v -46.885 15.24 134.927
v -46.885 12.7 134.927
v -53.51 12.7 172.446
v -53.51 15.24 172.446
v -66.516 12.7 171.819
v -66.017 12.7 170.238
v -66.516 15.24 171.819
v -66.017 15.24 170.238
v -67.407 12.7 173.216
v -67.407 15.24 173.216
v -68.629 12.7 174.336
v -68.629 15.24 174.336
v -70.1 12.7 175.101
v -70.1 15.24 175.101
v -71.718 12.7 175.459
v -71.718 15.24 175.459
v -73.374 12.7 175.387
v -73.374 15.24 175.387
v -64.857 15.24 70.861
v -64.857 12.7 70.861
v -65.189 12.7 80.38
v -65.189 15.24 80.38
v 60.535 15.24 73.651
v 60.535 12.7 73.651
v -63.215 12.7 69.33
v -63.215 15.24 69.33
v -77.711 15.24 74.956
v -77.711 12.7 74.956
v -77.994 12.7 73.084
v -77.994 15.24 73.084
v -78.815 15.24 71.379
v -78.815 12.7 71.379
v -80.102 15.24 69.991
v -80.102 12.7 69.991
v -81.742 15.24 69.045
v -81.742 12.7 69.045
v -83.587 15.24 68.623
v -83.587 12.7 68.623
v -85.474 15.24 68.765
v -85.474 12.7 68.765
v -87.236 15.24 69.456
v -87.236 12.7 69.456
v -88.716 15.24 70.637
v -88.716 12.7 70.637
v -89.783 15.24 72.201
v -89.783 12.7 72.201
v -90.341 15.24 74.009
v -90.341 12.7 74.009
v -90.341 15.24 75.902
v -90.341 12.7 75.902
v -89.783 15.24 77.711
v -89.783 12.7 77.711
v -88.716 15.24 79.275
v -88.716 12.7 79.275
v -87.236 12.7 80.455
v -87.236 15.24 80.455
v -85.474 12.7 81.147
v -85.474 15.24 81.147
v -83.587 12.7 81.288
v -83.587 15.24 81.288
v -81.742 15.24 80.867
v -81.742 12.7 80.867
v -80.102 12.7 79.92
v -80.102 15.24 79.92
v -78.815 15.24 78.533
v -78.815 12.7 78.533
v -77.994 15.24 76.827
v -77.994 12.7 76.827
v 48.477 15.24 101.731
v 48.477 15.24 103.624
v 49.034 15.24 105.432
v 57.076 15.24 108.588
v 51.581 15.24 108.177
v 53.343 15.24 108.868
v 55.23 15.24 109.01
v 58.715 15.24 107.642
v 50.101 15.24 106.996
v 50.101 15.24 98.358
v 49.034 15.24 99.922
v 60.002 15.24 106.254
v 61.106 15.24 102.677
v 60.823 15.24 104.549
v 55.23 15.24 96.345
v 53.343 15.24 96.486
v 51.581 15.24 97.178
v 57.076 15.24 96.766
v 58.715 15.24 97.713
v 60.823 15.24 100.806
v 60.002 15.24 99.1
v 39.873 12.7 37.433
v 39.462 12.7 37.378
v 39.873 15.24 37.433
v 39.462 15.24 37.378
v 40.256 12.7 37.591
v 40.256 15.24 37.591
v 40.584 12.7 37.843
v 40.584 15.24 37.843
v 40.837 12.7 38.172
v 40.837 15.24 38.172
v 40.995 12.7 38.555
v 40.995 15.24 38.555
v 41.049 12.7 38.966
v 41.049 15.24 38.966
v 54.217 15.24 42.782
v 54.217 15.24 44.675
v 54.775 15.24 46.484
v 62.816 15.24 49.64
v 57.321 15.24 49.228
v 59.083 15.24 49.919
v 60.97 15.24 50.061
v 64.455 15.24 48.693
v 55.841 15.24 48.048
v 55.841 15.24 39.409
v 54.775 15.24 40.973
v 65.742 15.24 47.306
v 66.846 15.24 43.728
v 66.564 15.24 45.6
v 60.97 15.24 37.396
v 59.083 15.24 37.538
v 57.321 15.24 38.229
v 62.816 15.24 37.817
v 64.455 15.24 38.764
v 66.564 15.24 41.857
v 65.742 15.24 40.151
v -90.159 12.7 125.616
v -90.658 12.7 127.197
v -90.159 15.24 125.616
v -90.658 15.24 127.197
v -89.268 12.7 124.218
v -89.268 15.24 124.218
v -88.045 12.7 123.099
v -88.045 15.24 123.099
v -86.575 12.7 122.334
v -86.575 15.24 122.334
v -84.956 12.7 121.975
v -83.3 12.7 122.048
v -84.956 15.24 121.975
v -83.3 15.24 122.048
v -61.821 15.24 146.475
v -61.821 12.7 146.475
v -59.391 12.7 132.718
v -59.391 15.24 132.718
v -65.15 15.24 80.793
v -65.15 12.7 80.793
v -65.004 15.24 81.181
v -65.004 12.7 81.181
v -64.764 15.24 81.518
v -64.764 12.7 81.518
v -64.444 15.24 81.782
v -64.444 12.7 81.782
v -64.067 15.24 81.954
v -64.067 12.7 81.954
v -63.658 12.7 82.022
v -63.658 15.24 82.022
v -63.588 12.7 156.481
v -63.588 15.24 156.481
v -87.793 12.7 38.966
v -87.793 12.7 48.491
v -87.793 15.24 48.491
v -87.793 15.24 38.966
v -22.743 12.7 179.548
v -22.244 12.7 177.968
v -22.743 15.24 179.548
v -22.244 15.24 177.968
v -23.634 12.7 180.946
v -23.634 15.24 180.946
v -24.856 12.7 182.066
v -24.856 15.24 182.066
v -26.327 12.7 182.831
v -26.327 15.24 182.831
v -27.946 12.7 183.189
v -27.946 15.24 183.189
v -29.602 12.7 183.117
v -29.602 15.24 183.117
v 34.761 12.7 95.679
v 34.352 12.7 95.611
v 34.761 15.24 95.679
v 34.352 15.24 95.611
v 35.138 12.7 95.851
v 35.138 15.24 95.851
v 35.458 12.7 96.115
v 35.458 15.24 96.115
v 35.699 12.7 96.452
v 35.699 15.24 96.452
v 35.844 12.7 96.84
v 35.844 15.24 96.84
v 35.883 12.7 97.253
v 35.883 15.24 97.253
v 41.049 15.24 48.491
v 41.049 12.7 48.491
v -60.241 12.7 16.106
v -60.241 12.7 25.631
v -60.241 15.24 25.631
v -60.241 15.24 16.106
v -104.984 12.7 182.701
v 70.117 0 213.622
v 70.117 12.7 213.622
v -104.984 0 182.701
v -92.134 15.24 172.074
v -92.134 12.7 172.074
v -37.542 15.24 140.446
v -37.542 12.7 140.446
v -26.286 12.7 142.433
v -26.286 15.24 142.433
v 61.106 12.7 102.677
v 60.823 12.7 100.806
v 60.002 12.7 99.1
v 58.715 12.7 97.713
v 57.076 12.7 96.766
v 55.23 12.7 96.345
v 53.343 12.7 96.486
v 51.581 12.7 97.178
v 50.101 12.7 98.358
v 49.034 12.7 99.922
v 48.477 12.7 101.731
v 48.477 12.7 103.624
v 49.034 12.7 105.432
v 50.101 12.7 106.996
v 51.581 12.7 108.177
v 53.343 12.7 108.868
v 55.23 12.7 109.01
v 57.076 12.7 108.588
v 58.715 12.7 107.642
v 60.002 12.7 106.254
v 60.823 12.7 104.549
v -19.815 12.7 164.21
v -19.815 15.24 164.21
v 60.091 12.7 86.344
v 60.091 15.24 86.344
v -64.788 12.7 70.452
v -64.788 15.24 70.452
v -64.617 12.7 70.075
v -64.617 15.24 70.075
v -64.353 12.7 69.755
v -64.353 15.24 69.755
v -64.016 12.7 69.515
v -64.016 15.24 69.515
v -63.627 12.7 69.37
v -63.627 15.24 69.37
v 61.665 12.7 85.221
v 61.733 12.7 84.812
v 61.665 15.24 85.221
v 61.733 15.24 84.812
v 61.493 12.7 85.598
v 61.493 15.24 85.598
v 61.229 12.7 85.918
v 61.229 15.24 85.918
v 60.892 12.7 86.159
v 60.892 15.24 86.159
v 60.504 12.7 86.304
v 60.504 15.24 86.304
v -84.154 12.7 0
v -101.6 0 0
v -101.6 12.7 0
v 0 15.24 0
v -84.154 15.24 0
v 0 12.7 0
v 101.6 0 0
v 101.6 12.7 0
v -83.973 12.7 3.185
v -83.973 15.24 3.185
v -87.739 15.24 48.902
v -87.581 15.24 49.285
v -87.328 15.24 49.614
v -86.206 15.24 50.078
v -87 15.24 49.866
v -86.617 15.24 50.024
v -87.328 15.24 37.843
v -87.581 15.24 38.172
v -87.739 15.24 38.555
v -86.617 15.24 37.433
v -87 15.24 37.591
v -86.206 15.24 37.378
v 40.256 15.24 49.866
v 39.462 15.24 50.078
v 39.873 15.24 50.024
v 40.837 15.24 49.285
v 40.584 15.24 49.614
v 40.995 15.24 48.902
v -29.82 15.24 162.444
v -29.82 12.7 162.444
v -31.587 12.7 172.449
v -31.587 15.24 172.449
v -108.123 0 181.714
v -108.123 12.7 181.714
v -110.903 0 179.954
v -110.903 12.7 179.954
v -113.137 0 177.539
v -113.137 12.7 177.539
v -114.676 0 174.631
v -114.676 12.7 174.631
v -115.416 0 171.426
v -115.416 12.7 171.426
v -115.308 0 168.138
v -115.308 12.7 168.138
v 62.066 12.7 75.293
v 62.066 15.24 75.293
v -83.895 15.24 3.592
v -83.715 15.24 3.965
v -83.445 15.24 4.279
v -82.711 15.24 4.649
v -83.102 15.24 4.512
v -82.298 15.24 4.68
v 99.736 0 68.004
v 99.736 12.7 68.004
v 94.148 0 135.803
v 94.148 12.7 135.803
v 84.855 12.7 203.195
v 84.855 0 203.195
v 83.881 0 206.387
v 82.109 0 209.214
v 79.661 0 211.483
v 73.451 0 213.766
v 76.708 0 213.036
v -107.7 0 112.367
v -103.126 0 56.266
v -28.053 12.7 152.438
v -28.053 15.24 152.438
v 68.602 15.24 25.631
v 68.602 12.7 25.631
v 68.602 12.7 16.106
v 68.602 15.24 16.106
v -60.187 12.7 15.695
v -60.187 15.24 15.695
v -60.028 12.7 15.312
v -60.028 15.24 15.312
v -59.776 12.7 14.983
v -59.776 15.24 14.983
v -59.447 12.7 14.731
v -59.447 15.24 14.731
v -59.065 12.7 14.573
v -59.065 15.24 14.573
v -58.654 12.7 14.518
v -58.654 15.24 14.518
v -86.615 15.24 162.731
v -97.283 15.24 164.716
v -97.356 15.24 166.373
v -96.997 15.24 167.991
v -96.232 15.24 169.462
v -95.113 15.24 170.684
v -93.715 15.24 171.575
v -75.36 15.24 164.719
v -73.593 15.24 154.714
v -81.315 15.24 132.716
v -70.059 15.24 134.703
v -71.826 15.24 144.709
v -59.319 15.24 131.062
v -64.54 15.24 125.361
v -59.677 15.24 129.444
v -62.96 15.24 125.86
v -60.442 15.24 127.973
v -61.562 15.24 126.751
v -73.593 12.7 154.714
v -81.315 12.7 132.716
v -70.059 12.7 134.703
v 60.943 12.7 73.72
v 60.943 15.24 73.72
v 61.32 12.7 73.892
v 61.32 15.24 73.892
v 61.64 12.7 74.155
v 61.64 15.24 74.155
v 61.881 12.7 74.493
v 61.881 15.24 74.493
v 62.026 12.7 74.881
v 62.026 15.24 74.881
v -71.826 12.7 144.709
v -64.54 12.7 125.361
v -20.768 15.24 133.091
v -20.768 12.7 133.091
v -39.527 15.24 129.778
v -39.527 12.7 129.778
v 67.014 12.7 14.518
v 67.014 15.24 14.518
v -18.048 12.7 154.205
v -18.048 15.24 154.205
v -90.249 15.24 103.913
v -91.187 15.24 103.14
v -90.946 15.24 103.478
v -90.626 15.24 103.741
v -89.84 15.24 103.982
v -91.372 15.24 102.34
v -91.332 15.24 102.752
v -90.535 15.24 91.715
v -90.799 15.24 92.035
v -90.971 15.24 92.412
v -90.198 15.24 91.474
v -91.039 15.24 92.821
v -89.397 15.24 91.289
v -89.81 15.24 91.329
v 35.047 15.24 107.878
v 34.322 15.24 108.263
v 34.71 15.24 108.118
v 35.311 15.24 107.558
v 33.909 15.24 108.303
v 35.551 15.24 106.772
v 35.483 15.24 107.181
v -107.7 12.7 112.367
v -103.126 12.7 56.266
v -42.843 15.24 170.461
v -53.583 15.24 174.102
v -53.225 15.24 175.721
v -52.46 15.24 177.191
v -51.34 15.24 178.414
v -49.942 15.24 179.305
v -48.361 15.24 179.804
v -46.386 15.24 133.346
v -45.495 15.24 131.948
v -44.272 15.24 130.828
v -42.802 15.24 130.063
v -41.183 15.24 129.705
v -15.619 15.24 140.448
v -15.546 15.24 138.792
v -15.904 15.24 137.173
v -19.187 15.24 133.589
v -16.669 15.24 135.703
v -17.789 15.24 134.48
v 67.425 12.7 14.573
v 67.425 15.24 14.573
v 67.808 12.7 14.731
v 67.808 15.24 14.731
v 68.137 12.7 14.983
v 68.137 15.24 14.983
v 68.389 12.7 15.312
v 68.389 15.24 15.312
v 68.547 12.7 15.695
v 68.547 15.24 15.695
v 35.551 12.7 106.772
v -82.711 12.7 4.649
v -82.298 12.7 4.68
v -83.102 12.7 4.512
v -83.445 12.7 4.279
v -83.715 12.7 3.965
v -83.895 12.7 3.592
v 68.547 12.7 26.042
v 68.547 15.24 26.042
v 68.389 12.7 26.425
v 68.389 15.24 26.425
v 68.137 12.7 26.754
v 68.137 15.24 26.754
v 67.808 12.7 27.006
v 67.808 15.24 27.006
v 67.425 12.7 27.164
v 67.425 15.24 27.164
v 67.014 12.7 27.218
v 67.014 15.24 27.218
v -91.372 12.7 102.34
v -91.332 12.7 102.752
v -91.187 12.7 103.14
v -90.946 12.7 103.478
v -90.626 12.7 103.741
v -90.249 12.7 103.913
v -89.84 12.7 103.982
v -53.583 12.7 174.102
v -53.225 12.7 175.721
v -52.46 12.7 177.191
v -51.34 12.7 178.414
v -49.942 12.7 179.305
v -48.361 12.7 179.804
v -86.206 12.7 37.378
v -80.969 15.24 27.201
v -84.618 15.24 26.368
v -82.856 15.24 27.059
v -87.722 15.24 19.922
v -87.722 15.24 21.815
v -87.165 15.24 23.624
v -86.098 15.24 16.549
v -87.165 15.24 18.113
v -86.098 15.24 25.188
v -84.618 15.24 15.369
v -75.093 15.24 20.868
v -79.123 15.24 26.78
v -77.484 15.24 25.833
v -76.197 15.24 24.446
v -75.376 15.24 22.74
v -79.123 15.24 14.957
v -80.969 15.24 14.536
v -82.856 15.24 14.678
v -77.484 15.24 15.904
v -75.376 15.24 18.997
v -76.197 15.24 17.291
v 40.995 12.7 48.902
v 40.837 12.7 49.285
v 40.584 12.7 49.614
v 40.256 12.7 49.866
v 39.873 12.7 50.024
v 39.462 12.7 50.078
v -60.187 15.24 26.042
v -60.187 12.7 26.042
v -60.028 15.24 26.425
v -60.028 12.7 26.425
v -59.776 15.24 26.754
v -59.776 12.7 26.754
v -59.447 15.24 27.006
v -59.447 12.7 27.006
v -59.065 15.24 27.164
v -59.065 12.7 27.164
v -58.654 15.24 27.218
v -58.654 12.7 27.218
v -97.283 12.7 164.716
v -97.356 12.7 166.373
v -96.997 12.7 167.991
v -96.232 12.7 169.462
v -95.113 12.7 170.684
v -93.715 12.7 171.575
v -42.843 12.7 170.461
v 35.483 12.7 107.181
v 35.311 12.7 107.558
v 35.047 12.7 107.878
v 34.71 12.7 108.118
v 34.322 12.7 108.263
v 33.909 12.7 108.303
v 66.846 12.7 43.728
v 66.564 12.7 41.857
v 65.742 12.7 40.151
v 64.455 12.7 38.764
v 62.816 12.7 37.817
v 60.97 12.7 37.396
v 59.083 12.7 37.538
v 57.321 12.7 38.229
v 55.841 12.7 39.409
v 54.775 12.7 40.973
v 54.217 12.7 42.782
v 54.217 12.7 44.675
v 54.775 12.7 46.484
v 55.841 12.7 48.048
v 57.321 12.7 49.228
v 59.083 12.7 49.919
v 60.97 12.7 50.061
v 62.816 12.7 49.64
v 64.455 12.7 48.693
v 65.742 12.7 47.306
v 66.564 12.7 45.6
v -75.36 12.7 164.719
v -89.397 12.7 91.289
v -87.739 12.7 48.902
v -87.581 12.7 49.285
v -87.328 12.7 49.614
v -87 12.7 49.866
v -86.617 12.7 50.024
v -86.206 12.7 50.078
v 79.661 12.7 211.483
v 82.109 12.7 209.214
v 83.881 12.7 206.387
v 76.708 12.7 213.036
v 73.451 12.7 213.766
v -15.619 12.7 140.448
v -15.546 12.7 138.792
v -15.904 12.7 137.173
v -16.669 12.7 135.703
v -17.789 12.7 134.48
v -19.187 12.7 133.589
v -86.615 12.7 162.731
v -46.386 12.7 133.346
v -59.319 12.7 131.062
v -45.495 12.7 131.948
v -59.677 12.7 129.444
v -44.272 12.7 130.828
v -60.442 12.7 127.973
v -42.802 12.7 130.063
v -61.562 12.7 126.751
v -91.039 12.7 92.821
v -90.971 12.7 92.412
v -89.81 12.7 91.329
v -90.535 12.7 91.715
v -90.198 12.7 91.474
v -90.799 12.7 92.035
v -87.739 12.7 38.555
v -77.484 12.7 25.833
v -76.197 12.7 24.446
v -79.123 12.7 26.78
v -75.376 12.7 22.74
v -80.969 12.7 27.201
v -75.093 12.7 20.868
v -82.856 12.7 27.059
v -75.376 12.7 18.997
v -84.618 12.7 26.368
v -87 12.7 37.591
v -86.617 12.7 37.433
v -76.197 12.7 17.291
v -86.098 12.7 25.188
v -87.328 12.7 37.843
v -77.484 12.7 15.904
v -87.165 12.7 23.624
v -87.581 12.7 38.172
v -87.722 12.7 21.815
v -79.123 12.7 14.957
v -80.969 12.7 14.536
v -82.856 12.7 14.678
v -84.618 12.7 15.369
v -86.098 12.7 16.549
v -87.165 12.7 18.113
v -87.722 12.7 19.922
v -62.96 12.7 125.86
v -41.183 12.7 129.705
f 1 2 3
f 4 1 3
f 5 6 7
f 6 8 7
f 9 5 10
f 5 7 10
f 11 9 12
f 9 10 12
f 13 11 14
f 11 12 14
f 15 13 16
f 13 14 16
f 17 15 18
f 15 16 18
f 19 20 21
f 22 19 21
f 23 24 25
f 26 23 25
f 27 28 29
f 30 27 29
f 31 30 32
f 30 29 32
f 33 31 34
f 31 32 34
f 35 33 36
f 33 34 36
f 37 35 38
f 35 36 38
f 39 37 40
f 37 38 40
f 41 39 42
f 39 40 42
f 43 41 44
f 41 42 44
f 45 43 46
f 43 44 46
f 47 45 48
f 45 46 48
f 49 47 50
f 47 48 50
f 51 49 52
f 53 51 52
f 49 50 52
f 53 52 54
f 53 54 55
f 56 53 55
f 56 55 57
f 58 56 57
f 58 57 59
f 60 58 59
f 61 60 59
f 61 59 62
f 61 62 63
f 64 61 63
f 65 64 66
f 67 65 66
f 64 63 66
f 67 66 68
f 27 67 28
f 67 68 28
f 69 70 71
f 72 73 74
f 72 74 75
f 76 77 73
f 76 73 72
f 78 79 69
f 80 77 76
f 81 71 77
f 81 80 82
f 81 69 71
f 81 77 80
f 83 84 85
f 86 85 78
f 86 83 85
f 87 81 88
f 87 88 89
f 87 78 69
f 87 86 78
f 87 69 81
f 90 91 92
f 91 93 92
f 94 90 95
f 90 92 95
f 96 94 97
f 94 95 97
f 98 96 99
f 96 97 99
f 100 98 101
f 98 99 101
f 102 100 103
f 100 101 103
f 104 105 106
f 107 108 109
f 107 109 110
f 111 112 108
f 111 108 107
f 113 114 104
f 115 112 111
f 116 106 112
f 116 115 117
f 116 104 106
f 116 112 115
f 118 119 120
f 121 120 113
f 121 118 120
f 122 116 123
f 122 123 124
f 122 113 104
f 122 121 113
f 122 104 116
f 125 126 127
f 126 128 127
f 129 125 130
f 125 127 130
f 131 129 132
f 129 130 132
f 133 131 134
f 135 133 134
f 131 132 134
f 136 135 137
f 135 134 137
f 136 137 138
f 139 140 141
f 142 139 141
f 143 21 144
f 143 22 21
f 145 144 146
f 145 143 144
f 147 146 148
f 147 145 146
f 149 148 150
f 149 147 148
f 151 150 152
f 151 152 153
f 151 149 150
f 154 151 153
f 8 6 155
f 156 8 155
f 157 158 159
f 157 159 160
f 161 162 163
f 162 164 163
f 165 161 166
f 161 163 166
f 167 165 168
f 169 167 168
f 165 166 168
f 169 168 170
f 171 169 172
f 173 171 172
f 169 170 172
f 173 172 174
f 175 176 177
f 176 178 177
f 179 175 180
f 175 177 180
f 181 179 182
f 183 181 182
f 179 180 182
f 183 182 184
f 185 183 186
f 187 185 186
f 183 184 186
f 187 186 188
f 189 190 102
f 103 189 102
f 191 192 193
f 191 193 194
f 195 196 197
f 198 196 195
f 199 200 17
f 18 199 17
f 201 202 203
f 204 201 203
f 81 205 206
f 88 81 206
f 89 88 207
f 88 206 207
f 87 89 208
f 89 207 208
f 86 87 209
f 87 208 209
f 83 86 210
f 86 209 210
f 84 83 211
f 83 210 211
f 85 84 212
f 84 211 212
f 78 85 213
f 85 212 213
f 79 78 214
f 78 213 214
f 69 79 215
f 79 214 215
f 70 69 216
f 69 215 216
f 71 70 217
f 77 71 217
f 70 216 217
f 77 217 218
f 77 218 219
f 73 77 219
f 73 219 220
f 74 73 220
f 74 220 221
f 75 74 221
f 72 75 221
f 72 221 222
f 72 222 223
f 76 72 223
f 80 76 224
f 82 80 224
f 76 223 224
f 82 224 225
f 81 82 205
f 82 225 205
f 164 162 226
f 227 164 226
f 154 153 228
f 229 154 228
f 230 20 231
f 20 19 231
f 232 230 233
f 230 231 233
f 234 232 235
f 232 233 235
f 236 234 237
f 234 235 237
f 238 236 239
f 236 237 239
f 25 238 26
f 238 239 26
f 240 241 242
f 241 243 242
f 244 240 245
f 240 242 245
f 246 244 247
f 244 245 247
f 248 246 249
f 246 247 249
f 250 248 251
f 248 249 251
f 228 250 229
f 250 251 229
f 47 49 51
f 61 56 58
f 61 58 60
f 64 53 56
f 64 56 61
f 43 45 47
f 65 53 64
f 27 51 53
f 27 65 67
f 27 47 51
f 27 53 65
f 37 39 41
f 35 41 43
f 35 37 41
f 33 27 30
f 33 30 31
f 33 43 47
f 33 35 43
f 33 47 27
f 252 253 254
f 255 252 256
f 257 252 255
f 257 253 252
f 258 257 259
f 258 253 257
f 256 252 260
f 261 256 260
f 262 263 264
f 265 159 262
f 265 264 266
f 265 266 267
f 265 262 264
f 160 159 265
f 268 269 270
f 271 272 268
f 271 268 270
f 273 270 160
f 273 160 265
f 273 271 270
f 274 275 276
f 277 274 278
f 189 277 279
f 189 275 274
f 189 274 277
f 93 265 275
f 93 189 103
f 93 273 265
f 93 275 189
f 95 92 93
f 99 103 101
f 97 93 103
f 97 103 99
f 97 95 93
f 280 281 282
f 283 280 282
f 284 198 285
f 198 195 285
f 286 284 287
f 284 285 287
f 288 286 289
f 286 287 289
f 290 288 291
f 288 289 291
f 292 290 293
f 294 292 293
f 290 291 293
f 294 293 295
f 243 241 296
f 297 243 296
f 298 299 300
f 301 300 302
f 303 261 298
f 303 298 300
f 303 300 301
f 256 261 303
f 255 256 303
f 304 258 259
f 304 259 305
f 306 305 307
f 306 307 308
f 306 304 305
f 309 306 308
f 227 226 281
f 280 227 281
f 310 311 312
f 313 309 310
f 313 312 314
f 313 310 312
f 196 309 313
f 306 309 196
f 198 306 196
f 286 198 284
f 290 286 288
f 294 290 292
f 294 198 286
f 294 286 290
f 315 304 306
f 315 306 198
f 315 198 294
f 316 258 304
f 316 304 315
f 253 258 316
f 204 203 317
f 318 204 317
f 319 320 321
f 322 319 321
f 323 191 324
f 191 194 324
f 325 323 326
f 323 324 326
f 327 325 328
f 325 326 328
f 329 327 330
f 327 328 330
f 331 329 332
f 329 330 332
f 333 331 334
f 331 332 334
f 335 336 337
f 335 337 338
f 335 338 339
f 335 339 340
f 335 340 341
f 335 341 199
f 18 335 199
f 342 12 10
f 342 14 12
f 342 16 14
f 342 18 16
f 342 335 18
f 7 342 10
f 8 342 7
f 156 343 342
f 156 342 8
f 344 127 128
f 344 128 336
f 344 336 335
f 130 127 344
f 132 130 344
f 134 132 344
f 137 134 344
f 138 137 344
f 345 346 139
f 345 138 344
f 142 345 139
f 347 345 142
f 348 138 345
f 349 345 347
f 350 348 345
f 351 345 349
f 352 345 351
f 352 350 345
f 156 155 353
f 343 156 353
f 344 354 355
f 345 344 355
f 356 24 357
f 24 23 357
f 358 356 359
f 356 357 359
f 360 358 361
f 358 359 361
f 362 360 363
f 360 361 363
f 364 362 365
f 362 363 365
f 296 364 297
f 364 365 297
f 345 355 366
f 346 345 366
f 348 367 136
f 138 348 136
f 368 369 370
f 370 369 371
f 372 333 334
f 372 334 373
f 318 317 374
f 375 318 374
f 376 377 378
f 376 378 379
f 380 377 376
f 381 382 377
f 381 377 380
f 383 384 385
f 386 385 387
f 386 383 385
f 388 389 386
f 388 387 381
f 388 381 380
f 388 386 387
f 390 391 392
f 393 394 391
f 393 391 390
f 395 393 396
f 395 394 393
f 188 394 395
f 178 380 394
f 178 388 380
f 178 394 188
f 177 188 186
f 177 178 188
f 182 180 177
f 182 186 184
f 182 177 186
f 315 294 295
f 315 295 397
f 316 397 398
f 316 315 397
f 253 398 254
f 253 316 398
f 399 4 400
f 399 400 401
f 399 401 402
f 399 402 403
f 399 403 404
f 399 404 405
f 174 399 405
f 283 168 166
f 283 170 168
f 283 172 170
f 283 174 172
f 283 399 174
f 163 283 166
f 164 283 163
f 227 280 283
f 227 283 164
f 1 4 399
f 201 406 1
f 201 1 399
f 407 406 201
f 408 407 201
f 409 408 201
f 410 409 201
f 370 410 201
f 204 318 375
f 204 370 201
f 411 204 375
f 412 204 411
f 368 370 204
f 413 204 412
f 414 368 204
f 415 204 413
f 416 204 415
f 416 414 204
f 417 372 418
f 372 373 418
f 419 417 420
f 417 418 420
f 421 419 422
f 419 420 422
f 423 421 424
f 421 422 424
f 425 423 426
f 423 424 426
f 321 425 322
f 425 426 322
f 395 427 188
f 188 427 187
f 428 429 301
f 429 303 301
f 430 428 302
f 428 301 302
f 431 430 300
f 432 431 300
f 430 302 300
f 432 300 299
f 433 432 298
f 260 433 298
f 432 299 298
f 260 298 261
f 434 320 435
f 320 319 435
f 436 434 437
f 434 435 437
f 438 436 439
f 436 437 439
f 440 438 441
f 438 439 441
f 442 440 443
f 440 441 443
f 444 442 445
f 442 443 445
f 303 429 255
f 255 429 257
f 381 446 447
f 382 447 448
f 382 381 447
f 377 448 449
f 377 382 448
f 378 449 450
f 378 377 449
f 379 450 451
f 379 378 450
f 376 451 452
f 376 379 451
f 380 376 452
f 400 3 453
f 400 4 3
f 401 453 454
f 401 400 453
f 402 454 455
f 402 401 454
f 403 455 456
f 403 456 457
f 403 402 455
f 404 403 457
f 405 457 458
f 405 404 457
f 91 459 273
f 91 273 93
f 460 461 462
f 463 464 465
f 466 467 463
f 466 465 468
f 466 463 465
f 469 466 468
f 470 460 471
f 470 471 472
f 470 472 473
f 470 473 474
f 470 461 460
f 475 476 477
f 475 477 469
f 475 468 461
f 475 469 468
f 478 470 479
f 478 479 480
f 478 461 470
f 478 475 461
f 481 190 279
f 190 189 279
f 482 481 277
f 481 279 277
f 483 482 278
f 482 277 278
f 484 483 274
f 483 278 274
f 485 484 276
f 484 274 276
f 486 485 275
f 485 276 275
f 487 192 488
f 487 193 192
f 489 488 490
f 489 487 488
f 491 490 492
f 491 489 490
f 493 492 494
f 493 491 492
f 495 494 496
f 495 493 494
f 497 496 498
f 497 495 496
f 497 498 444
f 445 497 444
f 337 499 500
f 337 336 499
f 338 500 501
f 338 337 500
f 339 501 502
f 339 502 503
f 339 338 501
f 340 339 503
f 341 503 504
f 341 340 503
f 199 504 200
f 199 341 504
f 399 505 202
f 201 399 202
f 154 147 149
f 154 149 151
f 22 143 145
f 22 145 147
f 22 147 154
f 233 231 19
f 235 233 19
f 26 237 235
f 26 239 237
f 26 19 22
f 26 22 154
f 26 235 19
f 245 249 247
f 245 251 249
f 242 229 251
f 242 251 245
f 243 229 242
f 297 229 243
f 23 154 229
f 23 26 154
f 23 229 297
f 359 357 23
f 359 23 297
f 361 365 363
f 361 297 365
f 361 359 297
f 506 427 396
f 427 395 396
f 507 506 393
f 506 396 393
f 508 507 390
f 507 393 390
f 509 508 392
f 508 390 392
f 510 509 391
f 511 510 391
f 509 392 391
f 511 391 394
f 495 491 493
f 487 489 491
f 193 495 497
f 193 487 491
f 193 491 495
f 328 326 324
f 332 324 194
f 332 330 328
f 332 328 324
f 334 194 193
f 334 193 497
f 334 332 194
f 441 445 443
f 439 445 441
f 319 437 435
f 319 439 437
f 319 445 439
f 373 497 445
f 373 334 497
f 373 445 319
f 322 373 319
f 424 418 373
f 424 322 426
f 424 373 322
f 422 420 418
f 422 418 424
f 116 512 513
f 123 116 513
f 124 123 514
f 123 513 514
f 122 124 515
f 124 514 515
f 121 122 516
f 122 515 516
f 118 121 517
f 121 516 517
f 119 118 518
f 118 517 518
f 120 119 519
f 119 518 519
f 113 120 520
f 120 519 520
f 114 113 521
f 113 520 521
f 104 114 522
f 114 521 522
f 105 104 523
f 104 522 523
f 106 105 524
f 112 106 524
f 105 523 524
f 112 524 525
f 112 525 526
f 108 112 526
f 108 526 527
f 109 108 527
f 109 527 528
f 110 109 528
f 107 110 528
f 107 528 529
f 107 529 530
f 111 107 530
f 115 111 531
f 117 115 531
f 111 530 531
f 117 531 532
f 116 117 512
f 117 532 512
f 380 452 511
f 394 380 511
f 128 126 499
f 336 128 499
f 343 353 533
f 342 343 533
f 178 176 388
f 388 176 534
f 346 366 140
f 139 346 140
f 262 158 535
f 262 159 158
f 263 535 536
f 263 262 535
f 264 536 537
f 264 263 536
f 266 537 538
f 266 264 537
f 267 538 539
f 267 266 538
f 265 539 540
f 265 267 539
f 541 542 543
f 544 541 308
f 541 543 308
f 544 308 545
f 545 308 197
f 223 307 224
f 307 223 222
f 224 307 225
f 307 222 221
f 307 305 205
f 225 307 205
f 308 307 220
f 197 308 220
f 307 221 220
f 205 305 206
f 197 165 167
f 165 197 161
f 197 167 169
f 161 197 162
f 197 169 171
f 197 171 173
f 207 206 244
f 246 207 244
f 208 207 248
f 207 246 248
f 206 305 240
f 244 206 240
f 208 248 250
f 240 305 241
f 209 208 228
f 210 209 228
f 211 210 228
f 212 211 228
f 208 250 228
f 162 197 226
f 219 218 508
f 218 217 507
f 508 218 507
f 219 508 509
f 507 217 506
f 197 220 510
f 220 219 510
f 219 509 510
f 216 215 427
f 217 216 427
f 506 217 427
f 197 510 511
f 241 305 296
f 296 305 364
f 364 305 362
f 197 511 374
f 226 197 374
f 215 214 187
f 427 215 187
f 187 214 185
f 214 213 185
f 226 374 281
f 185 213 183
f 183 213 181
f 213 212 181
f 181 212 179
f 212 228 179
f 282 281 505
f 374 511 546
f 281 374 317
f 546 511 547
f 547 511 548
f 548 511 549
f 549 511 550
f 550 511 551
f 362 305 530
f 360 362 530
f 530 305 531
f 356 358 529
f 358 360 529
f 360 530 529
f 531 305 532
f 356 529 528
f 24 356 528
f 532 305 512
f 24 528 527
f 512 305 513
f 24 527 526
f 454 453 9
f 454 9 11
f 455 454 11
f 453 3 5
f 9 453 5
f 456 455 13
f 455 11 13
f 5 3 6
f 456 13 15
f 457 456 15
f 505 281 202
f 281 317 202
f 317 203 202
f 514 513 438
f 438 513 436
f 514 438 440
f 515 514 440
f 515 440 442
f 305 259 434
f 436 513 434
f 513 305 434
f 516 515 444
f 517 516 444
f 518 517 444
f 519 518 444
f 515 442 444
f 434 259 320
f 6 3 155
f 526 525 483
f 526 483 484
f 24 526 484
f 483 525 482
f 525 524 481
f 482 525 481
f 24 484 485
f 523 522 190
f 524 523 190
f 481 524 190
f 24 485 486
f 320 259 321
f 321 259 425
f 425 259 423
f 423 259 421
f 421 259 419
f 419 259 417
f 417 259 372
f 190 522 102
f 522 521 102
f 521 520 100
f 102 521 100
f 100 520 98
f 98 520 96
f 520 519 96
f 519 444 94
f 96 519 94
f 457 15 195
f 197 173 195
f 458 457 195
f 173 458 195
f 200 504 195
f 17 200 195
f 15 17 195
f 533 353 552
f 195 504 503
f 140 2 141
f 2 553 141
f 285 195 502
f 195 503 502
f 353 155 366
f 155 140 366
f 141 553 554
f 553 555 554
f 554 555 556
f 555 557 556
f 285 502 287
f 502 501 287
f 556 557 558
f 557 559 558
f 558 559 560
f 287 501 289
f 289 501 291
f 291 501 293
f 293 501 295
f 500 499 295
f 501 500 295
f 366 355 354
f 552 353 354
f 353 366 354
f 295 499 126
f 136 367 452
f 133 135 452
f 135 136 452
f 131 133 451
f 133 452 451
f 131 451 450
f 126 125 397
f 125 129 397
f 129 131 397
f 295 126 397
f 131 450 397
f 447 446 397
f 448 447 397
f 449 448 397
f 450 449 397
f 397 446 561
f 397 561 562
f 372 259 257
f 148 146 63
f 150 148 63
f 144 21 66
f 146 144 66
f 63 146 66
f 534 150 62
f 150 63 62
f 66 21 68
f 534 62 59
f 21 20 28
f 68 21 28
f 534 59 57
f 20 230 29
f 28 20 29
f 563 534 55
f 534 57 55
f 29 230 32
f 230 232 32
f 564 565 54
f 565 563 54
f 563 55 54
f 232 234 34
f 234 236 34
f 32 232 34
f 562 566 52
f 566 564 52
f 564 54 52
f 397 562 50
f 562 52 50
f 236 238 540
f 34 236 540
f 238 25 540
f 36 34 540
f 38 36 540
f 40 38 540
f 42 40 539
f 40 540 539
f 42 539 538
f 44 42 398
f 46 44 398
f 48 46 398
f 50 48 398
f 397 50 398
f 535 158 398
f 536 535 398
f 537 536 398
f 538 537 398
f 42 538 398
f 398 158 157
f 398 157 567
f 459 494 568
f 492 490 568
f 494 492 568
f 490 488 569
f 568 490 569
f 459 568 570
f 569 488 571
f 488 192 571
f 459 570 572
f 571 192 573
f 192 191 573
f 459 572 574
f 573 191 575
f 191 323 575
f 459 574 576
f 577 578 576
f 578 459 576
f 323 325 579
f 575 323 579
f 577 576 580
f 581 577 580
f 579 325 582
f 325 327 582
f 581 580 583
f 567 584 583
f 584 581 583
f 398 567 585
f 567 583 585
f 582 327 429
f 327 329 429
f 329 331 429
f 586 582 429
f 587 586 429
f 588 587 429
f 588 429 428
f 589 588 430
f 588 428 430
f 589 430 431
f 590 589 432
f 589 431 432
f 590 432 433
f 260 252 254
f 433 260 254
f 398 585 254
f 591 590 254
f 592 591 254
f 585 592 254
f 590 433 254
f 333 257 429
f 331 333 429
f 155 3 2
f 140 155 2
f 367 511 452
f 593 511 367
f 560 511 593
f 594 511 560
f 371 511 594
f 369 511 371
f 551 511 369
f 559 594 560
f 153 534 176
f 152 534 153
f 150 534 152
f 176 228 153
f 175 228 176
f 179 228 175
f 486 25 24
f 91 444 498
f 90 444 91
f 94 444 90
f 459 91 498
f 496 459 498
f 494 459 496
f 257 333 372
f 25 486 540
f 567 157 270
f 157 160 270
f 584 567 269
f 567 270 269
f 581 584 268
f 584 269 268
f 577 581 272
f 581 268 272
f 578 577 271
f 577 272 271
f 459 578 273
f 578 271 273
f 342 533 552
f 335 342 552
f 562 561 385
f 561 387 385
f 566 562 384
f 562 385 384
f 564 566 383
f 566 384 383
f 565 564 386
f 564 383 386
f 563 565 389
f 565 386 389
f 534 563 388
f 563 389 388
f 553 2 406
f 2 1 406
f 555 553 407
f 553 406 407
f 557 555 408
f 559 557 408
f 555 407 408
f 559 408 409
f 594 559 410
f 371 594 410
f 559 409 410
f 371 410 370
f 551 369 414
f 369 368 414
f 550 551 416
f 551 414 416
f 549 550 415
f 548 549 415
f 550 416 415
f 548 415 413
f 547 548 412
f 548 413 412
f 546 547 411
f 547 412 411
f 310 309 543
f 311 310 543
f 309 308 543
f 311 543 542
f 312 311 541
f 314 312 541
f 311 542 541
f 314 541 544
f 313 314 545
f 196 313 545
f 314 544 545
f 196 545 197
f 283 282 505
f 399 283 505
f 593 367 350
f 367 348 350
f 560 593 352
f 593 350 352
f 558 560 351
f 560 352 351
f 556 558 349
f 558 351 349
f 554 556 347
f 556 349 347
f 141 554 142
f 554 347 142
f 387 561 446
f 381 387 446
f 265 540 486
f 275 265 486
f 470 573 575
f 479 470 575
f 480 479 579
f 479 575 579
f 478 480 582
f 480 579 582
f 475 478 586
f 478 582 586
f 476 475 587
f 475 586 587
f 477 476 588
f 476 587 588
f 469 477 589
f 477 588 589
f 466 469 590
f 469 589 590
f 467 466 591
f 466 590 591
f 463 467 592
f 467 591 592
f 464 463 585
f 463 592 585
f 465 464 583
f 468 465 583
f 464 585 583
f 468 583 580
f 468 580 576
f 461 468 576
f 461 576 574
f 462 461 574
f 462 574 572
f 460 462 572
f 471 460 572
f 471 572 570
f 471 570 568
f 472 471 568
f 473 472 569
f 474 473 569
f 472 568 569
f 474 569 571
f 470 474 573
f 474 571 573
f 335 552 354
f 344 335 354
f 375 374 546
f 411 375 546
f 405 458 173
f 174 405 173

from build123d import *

# Parameters (mm, degrees)
BOSS_EXTRUDE1_DEPTH = 12.7
FILLET1_R           = 12.7
BOSS_EXTRUDE2_DEPTH = 2.54
FILLET2_R           = 6.35
SKETCH3_R           = 6.35
SKETCH3_W           = 128.842678874
SKETCH3_H           = 12.7
BOSS_EXTRUDE3_DEPTH = 2.54
FILLET3_R           = 1.5875


with BuildPart() as part:
    # Sketch1 → Boss-Extrude1 (new body)
    with BuildSketch(Plane(origin=(0, 0, 0), x_dir=(1, 0, 0), z_dir=(0, 1, 0))):
        with BuildLine():
            Line((-101.6, 0), (101.6, 0))
            ThreePointArc((101.6, 0), (96.863119244, -108.334556213), (82.688632431, -215.842221209))
            Line((82.688632431, -215.842221209), (-117.415334702, -180.506087613))
            ThreePointArc((-117.415334702, -180.506087613), (-105.561392761, -90.598803078), (-101.6, 0))
        make_face()
    extrude(amount=BOSS_EXTRUDE1_DEPTH)

    # Fillet1
    fillet1_edges = [part.edges().sort_by_distance(p)[0] for p in [
        (82.688632431, 6.35, 215.842221209),
        (-117.415334702, 6.35, 180.506087613),
    ]]
    fillet(fillet1_edges, radius=FILLET1_R)

    # Sketch2 → Boss-Extrude2 (add)
    with BuildSketch(Plane(origin=(0, 12.7, 0), x_dir=(1, 0, 0), z_dir=(0, 1, 0))):
        Polygon((-54.61463437, -178.699496428), (-23.348389506, -184.220767302), (-19.814776146, -164.210370589), (-29.819974503, -162.443563909), (-31.586781182, -172.448762265), (-42.842629334, -170.461104751), (-37.542209294, -140.445509681), (-26.286361143, -142.433167195), (-28.053167823, -152.438365552), (-18.047969466, -154.205172232), (-14.514356107, -134.194775519), (-45.780600971, -128.673504644), align=None)
        Polygon((-98.387377181, -170.969717203), (-67.121132316, -176.490988078), (-63.587518956, -156.480591364), (-73.592717313, -154.713784685), (-75.359523993, -164.718983041), (-86.615372144, -162.731325527), (-81.314952105, -132.715730457), (-70.059103953, -134.703387971), (-71.825910633, -144.708586328), (-61.820712277, -146.475393008), (-58.287098917, -126.464996294), (-89.553343782, -120.94372542), align=None)
    extrude(amount=BOSS_EXTRUDE2_DEPTH)

    # Fillet2
    fillet2_edges = [part.edges().sort_by_distance(p)[0] for p in [
        (-67.121132316, 13.97, 176.490988078),
        (-58.287098917, 13.97, 126.464996294),
        (-89.553343782, 13.97, 120.94372542),
        (-98.387377181, 13.97, 170.969717203),
        (-23.348389506, 13.97, 184.220767302),
        (-14.514356107, 13.97, 134.194775519),
        (-45.780600971, 13.97, 128.673504644),
        (-54.61463437, 13.97, 178.699496428),
    ]]
    fillet(fillet2_edges, radius=FILLET2_R)

    # Sketch3 → Boss-Extrude3 (add)
    with BuildSketch(Plane(origin=(0, 12.7, 0), x_dir=(1, 0, 0), z_dir=(0, 1, 0))):
        with Locations((-84.061485004, -74.95573952)):
            Circle(SKETCH3_R)
        with Locations((54.755611036, -102.677273515)):
            Circle(SKETCH3_R)
        with Locations((-81.443399967, -20.868490804)):
            Circle(SKETCH3_R)
        with Locations((60.495827673, -43.728490804)):
            Circle(SKETCH3_R)
        Polygon((-65.244701553, -81.966706683), (61.677933479, -86.398942765), (62.121157087, -73.706679262), (-64.801477945, -69.27444318), align=None)
        Polygon((-91.427031054, -103.926333773), (35.495603978, -108.358569854), (35.938827586, -95.666306351), (-90.983807446, -91.23407027), align=None)
        with Locations((4.18018601, -20.868490804)):
            Rectangle(SKETCH3_W, SKETCH3_H)
        with Locations((-23.37206053, -43.728490804)):
            Rectangle(SKETCH3_W, SKETCH3_H)
        Polygon((-84.153810009, 0), (-83.882599151, -4.769682556), (0, 0), align=None)
    extrude(amount=BOSS_EXTRUDE3_DEPTH)

    # Fillet3
    fillet3_edges = [part.edges().sort_by_distance(p)[0] for p in [
        (-64.801477945, 13.97, 69.27444318),
        (-65.244701553, 13.97, 81.966706683),
        (61.677933479, 13.97, 86.398942765),
        (62.121157087, 13.97, 73.706679262),
        (-83.882599151, 13.97, 4.769682556),
        (-90.983807446, 13.97, 91.23407027),
        (-91.427031054, 13.97, 103.926333773),
        (35.495603978, 13.97, 108.358569854),
        (35.938827586, 13.97, 95.666306351),
        (-60.241153427, 13.97, 14.518490804),
        (-60.241153427, 13.97, 27.218490804),
        (68.601525447, 13.97, 27.218490804),
        (68.601525447, 13.97, 14.518490804),
        (-87.793399967, 13.97, 37.378490804),
        (-87.793399967, 13.97, 50.078490804),
        (41.049278907, 13.97, 50.078490804),
        (41.049278907, 13.97, 37.378490804),
    ]]
    fillet(fillet3_edges, radius=FILLET3_R)


solid = part.part
